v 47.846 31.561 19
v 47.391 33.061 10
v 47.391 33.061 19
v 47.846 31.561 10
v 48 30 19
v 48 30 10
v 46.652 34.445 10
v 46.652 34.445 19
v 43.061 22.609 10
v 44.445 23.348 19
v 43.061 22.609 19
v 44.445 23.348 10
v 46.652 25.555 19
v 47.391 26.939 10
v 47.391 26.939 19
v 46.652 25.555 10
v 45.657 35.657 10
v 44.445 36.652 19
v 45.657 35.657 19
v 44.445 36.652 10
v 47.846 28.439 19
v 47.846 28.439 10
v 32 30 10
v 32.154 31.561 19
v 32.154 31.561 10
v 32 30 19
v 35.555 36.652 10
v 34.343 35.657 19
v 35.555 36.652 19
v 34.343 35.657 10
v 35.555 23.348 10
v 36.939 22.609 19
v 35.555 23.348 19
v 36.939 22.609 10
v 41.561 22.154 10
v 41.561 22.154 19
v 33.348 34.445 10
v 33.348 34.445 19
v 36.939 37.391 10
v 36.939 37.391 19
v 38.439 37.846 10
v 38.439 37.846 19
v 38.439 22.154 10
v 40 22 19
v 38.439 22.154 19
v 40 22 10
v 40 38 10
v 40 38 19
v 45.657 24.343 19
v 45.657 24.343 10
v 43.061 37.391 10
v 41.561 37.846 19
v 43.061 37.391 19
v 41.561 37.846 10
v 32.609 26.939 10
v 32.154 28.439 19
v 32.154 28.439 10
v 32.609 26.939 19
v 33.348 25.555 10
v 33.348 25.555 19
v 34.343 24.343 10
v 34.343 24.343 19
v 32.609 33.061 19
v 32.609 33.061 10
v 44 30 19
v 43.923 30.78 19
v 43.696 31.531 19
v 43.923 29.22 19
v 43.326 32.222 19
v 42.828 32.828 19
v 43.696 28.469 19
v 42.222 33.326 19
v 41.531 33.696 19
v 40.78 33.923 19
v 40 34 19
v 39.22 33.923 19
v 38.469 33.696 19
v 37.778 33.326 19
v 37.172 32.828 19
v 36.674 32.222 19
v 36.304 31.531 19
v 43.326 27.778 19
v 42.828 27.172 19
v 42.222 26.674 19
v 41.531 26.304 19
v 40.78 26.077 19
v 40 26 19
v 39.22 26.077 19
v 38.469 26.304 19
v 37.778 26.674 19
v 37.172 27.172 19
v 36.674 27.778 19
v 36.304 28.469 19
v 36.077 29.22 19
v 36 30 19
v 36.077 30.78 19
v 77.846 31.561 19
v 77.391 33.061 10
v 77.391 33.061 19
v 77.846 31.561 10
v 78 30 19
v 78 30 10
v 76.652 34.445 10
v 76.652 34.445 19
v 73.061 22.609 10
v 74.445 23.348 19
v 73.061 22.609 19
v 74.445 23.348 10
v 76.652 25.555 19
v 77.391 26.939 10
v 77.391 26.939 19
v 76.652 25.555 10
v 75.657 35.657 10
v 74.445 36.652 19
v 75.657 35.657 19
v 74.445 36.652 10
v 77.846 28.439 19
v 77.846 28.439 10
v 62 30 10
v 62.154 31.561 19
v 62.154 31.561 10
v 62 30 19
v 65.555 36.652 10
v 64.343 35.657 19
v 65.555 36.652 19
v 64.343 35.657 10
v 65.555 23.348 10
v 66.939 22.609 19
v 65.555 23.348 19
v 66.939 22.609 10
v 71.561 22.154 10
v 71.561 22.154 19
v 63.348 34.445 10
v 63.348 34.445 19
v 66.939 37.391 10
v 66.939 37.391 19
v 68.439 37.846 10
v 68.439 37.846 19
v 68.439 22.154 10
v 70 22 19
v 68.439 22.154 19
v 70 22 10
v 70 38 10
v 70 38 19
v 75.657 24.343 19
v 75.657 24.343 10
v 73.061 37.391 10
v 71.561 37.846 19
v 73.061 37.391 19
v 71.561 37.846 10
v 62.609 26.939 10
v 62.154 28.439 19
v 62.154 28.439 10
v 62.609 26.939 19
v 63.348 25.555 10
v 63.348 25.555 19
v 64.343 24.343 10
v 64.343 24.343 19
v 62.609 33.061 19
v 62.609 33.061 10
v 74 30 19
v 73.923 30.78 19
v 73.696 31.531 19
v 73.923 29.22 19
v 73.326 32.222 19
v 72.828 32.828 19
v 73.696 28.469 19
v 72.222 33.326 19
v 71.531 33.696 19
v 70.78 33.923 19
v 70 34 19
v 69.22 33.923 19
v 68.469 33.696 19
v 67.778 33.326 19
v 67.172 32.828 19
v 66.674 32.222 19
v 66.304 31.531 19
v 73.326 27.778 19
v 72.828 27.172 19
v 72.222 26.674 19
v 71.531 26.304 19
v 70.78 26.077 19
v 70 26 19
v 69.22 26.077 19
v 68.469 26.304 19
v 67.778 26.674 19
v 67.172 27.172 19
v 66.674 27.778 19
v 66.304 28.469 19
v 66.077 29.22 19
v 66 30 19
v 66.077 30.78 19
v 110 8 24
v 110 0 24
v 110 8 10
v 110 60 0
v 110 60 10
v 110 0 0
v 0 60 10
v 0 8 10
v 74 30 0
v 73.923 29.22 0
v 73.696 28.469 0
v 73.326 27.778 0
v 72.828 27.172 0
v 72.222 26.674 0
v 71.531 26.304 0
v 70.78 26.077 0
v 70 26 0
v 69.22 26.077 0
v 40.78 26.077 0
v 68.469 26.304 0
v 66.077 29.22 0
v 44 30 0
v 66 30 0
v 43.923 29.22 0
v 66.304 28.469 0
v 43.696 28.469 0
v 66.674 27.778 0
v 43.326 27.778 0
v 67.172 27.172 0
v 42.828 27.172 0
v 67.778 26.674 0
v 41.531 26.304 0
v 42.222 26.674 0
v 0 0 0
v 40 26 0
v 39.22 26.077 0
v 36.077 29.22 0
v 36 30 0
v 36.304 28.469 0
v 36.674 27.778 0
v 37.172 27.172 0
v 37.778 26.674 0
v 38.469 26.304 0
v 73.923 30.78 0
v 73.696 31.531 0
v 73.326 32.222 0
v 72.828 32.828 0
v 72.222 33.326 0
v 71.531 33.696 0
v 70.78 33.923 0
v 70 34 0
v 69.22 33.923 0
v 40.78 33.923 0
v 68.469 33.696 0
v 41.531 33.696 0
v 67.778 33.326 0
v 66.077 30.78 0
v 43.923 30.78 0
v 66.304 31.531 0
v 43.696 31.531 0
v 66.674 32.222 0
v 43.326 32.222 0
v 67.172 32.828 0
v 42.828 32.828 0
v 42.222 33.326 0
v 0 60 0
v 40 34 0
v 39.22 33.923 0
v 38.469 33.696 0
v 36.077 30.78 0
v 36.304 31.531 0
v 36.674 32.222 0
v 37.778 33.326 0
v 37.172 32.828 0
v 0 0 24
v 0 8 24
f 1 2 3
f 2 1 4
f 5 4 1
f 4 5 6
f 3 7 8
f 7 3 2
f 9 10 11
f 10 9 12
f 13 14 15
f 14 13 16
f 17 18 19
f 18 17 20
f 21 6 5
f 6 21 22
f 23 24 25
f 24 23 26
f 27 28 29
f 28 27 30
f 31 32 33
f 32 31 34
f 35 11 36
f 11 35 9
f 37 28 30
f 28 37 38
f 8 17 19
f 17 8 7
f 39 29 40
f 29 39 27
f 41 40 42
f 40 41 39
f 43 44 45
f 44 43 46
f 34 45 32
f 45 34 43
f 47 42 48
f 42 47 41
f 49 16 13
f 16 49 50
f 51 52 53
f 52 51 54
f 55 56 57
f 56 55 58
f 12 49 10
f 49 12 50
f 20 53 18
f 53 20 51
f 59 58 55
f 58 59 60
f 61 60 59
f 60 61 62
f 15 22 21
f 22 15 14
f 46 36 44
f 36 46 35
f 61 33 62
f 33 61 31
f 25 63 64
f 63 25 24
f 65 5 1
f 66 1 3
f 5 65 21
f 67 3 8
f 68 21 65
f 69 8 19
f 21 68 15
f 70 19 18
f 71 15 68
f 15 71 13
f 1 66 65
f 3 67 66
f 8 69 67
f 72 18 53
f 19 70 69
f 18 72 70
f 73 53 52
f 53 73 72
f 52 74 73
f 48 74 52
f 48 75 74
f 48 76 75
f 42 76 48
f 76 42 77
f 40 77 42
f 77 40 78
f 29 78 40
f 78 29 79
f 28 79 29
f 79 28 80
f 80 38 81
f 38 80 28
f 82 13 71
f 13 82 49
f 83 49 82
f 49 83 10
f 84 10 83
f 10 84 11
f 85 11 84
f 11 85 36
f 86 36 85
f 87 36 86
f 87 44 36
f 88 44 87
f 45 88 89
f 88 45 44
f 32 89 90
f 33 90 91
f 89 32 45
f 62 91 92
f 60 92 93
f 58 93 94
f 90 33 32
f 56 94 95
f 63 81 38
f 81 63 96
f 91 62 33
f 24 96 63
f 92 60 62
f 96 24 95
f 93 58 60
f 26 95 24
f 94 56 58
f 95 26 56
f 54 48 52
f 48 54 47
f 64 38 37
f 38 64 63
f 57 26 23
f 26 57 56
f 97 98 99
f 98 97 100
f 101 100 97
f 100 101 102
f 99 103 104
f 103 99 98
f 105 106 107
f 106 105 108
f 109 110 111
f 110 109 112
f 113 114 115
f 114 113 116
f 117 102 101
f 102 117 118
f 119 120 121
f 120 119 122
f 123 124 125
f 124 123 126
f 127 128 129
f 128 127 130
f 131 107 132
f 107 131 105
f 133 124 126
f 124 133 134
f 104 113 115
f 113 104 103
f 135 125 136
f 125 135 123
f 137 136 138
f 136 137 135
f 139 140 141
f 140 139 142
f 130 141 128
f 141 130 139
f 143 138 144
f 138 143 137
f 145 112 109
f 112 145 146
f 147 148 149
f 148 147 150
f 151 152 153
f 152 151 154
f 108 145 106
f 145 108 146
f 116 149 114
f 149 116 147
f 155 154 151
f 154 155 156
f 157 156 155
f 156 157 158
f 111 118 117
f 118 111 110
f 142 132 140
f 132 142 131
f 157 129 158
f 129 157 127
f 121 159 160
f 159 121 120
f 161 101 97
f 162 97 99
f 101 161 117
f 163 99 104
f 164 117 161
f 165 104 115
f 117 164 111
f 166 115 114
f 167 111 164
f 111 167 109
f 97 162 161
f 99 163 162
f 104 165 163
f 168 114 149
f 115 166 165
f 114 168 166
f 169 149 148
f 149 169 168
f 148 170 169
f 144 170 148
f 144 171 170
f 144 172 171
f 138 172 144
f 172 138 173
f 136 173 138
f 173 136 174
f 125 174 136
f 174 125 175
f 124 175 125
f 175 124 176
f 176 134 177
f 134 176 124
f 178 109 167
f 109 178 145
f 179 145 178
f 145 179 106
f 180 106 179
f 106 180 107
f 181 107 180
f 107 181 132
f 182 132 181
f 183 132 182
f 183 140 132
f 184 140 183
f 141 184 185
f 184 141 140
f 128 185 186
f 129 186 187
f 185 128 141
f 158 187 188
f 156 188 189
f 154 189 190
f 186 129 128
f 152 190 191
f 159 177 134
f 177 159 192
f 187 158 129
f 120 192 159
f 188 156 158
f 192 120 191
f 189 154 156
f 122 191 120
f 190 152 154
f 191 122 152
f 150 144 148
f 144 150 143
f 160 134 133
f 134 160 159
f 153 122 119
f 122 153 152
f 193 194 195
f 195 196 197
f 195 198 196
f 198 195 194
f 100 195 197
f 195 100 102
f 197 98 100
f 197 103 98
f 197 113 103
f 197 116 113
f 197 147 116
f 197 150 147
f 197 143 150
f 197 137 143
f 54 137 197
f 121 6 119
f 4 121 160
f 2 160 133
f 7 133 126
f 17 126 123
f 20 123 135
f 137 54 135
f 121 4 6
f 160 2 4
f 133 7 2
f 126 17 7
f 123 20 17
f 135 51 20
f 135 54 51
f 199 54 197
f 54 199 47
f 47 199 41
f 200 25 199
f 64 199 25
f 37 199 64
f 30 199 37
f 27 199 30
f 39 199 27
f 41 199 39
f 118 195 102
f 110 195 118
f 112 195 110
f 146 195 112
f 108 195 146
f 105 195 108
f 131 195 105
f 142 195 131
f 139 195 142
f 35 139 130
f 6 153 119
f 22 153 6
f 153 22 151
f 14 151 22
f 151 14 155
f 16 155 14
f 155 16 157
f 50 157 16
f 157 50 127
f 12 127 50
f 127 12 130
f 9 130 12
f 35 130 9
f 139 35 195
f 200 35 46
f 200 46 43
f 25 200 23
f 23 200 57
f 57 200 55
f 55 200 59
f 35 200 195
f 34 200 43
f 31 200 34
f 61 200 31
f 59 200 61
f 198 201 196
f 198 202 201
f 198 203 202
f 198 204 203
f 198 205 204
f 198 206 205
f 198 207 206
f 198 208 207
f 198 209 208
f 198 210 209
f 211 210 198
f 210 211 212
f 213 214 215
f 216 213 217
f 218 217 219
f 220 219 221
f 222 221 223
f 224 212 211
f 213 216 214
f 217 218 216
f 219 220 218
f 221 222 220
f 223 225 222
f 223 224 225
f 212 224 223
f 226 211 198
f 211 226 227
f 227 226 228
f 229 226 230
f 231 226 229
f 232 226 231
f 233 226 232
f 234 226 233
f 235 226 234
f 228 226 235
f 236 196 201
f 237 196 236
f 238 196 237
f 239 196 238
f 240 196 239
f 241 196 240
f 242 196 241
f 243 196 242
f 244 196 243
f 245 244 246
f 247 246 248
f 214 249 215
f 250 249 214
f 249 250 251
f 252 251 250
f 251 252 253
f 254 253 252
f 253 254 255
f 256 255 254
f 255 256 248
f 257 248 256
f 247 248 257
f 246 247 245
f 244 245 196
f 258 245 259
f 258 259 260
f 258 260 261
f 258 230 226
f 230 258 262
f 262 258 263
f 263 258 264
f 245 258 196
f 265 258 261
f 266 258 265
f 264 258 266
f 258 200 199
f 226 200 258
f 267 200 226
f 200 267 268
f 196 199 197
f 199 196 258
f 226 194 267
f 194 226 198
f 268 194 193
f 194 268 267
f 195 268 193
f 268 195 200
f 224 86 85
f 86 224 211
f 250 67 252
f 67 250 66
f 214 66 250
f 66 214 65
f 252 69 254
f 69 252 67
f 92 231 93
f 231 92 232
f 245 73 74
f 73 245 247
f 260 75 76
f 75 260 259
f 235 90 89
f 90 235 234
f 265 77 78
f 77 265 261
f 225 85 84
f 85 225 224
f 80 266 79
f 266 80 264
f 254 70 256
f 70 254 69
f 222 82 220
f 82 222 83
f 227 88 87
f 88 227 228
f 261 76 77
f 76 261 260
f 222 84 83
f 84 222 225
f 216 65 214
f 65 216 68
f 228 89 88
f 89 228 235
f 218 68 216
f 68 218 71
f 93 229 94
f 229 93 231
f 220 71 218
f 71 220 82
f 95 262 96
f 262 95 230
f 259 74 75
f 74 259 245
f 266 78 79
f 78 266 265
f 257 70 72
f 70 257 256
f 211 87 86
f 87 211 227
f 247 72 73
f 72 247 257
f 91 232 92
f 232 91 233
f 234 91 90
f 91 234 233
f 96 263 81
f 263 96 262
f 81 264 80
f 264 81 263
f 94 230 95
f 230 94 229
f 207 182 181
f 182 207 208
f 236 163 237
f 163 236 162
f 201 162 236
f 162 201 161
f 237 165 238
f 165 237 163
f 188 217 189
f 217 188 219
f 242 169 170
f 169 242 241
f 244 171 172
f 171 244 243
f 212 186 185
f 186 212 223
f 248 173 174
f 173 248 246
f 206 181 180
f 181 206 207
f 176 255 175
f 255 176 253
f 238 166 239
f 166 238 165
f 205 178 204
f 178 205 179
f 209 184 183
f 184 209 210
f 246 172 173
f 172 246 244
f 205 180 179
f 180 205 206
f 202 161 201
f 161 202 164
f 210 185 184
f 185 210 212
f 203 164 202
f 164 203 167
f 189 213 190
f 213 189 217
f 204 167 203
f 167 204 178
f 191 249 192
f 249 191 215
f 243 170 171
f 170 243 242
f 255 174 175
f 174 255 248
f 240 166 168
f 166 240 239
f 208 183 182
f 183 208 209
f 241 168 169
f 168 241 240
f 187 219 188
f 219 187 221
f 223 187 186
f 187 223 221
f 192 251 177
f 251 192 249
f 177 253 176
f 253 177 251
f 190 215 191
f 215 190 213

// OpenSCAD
$fn = 32;

// ----------------------------------------------------------------------
// Drill jig: fence jig
// ----------------------------------------------------------------------

// --- parameters (mm) ---
plate_l = 110;            // plate length, X
plate_w = 60;             // plate width, Y
plate_t = 10;             // plate thickness
boss_d = 16;              // guide boss diameter
boss_h = 10;              // boss height above the plate
guide_d = 8;              // guide hole diameter
boss_pitch = 30;          // boss pitch
fence_h = 15;             // fence height above the plate
fence_t = 8;              // fence thickness

n_boss = 2;  // guide bosses
boss_x0 = (plate_l - (n_boss - 1) * boss_pitch) / 2;  // first boss X
boss_top = plate_t - 1 + boss_h;  // boss crown height
fence_top = plate_t - 1 + fence_h;  // fence crown height
total_h = max([fence_top, boss_top]);  // overall height

difference() {
  union() {
  cube([plate_l, plate_w, plate_t]);
  for (i = [0 : n_boss - 1])
    translate([boss_x0 + i * boss_pitch, plate_w / 2, plate_t - 1])
      cylinder(h = boss_h, d = boss_d);
  translate([0, 0, plate_t - 1]) cube([plate_l, fence_t, fence_h]);
  }
  for (i = [0 : n_boss - 1])
    translate([boss_x0 + i * boss_pitch, plate_w / 2, -1])
      cylinder(h = plate_t + boss_h, d = guide_d);
}
